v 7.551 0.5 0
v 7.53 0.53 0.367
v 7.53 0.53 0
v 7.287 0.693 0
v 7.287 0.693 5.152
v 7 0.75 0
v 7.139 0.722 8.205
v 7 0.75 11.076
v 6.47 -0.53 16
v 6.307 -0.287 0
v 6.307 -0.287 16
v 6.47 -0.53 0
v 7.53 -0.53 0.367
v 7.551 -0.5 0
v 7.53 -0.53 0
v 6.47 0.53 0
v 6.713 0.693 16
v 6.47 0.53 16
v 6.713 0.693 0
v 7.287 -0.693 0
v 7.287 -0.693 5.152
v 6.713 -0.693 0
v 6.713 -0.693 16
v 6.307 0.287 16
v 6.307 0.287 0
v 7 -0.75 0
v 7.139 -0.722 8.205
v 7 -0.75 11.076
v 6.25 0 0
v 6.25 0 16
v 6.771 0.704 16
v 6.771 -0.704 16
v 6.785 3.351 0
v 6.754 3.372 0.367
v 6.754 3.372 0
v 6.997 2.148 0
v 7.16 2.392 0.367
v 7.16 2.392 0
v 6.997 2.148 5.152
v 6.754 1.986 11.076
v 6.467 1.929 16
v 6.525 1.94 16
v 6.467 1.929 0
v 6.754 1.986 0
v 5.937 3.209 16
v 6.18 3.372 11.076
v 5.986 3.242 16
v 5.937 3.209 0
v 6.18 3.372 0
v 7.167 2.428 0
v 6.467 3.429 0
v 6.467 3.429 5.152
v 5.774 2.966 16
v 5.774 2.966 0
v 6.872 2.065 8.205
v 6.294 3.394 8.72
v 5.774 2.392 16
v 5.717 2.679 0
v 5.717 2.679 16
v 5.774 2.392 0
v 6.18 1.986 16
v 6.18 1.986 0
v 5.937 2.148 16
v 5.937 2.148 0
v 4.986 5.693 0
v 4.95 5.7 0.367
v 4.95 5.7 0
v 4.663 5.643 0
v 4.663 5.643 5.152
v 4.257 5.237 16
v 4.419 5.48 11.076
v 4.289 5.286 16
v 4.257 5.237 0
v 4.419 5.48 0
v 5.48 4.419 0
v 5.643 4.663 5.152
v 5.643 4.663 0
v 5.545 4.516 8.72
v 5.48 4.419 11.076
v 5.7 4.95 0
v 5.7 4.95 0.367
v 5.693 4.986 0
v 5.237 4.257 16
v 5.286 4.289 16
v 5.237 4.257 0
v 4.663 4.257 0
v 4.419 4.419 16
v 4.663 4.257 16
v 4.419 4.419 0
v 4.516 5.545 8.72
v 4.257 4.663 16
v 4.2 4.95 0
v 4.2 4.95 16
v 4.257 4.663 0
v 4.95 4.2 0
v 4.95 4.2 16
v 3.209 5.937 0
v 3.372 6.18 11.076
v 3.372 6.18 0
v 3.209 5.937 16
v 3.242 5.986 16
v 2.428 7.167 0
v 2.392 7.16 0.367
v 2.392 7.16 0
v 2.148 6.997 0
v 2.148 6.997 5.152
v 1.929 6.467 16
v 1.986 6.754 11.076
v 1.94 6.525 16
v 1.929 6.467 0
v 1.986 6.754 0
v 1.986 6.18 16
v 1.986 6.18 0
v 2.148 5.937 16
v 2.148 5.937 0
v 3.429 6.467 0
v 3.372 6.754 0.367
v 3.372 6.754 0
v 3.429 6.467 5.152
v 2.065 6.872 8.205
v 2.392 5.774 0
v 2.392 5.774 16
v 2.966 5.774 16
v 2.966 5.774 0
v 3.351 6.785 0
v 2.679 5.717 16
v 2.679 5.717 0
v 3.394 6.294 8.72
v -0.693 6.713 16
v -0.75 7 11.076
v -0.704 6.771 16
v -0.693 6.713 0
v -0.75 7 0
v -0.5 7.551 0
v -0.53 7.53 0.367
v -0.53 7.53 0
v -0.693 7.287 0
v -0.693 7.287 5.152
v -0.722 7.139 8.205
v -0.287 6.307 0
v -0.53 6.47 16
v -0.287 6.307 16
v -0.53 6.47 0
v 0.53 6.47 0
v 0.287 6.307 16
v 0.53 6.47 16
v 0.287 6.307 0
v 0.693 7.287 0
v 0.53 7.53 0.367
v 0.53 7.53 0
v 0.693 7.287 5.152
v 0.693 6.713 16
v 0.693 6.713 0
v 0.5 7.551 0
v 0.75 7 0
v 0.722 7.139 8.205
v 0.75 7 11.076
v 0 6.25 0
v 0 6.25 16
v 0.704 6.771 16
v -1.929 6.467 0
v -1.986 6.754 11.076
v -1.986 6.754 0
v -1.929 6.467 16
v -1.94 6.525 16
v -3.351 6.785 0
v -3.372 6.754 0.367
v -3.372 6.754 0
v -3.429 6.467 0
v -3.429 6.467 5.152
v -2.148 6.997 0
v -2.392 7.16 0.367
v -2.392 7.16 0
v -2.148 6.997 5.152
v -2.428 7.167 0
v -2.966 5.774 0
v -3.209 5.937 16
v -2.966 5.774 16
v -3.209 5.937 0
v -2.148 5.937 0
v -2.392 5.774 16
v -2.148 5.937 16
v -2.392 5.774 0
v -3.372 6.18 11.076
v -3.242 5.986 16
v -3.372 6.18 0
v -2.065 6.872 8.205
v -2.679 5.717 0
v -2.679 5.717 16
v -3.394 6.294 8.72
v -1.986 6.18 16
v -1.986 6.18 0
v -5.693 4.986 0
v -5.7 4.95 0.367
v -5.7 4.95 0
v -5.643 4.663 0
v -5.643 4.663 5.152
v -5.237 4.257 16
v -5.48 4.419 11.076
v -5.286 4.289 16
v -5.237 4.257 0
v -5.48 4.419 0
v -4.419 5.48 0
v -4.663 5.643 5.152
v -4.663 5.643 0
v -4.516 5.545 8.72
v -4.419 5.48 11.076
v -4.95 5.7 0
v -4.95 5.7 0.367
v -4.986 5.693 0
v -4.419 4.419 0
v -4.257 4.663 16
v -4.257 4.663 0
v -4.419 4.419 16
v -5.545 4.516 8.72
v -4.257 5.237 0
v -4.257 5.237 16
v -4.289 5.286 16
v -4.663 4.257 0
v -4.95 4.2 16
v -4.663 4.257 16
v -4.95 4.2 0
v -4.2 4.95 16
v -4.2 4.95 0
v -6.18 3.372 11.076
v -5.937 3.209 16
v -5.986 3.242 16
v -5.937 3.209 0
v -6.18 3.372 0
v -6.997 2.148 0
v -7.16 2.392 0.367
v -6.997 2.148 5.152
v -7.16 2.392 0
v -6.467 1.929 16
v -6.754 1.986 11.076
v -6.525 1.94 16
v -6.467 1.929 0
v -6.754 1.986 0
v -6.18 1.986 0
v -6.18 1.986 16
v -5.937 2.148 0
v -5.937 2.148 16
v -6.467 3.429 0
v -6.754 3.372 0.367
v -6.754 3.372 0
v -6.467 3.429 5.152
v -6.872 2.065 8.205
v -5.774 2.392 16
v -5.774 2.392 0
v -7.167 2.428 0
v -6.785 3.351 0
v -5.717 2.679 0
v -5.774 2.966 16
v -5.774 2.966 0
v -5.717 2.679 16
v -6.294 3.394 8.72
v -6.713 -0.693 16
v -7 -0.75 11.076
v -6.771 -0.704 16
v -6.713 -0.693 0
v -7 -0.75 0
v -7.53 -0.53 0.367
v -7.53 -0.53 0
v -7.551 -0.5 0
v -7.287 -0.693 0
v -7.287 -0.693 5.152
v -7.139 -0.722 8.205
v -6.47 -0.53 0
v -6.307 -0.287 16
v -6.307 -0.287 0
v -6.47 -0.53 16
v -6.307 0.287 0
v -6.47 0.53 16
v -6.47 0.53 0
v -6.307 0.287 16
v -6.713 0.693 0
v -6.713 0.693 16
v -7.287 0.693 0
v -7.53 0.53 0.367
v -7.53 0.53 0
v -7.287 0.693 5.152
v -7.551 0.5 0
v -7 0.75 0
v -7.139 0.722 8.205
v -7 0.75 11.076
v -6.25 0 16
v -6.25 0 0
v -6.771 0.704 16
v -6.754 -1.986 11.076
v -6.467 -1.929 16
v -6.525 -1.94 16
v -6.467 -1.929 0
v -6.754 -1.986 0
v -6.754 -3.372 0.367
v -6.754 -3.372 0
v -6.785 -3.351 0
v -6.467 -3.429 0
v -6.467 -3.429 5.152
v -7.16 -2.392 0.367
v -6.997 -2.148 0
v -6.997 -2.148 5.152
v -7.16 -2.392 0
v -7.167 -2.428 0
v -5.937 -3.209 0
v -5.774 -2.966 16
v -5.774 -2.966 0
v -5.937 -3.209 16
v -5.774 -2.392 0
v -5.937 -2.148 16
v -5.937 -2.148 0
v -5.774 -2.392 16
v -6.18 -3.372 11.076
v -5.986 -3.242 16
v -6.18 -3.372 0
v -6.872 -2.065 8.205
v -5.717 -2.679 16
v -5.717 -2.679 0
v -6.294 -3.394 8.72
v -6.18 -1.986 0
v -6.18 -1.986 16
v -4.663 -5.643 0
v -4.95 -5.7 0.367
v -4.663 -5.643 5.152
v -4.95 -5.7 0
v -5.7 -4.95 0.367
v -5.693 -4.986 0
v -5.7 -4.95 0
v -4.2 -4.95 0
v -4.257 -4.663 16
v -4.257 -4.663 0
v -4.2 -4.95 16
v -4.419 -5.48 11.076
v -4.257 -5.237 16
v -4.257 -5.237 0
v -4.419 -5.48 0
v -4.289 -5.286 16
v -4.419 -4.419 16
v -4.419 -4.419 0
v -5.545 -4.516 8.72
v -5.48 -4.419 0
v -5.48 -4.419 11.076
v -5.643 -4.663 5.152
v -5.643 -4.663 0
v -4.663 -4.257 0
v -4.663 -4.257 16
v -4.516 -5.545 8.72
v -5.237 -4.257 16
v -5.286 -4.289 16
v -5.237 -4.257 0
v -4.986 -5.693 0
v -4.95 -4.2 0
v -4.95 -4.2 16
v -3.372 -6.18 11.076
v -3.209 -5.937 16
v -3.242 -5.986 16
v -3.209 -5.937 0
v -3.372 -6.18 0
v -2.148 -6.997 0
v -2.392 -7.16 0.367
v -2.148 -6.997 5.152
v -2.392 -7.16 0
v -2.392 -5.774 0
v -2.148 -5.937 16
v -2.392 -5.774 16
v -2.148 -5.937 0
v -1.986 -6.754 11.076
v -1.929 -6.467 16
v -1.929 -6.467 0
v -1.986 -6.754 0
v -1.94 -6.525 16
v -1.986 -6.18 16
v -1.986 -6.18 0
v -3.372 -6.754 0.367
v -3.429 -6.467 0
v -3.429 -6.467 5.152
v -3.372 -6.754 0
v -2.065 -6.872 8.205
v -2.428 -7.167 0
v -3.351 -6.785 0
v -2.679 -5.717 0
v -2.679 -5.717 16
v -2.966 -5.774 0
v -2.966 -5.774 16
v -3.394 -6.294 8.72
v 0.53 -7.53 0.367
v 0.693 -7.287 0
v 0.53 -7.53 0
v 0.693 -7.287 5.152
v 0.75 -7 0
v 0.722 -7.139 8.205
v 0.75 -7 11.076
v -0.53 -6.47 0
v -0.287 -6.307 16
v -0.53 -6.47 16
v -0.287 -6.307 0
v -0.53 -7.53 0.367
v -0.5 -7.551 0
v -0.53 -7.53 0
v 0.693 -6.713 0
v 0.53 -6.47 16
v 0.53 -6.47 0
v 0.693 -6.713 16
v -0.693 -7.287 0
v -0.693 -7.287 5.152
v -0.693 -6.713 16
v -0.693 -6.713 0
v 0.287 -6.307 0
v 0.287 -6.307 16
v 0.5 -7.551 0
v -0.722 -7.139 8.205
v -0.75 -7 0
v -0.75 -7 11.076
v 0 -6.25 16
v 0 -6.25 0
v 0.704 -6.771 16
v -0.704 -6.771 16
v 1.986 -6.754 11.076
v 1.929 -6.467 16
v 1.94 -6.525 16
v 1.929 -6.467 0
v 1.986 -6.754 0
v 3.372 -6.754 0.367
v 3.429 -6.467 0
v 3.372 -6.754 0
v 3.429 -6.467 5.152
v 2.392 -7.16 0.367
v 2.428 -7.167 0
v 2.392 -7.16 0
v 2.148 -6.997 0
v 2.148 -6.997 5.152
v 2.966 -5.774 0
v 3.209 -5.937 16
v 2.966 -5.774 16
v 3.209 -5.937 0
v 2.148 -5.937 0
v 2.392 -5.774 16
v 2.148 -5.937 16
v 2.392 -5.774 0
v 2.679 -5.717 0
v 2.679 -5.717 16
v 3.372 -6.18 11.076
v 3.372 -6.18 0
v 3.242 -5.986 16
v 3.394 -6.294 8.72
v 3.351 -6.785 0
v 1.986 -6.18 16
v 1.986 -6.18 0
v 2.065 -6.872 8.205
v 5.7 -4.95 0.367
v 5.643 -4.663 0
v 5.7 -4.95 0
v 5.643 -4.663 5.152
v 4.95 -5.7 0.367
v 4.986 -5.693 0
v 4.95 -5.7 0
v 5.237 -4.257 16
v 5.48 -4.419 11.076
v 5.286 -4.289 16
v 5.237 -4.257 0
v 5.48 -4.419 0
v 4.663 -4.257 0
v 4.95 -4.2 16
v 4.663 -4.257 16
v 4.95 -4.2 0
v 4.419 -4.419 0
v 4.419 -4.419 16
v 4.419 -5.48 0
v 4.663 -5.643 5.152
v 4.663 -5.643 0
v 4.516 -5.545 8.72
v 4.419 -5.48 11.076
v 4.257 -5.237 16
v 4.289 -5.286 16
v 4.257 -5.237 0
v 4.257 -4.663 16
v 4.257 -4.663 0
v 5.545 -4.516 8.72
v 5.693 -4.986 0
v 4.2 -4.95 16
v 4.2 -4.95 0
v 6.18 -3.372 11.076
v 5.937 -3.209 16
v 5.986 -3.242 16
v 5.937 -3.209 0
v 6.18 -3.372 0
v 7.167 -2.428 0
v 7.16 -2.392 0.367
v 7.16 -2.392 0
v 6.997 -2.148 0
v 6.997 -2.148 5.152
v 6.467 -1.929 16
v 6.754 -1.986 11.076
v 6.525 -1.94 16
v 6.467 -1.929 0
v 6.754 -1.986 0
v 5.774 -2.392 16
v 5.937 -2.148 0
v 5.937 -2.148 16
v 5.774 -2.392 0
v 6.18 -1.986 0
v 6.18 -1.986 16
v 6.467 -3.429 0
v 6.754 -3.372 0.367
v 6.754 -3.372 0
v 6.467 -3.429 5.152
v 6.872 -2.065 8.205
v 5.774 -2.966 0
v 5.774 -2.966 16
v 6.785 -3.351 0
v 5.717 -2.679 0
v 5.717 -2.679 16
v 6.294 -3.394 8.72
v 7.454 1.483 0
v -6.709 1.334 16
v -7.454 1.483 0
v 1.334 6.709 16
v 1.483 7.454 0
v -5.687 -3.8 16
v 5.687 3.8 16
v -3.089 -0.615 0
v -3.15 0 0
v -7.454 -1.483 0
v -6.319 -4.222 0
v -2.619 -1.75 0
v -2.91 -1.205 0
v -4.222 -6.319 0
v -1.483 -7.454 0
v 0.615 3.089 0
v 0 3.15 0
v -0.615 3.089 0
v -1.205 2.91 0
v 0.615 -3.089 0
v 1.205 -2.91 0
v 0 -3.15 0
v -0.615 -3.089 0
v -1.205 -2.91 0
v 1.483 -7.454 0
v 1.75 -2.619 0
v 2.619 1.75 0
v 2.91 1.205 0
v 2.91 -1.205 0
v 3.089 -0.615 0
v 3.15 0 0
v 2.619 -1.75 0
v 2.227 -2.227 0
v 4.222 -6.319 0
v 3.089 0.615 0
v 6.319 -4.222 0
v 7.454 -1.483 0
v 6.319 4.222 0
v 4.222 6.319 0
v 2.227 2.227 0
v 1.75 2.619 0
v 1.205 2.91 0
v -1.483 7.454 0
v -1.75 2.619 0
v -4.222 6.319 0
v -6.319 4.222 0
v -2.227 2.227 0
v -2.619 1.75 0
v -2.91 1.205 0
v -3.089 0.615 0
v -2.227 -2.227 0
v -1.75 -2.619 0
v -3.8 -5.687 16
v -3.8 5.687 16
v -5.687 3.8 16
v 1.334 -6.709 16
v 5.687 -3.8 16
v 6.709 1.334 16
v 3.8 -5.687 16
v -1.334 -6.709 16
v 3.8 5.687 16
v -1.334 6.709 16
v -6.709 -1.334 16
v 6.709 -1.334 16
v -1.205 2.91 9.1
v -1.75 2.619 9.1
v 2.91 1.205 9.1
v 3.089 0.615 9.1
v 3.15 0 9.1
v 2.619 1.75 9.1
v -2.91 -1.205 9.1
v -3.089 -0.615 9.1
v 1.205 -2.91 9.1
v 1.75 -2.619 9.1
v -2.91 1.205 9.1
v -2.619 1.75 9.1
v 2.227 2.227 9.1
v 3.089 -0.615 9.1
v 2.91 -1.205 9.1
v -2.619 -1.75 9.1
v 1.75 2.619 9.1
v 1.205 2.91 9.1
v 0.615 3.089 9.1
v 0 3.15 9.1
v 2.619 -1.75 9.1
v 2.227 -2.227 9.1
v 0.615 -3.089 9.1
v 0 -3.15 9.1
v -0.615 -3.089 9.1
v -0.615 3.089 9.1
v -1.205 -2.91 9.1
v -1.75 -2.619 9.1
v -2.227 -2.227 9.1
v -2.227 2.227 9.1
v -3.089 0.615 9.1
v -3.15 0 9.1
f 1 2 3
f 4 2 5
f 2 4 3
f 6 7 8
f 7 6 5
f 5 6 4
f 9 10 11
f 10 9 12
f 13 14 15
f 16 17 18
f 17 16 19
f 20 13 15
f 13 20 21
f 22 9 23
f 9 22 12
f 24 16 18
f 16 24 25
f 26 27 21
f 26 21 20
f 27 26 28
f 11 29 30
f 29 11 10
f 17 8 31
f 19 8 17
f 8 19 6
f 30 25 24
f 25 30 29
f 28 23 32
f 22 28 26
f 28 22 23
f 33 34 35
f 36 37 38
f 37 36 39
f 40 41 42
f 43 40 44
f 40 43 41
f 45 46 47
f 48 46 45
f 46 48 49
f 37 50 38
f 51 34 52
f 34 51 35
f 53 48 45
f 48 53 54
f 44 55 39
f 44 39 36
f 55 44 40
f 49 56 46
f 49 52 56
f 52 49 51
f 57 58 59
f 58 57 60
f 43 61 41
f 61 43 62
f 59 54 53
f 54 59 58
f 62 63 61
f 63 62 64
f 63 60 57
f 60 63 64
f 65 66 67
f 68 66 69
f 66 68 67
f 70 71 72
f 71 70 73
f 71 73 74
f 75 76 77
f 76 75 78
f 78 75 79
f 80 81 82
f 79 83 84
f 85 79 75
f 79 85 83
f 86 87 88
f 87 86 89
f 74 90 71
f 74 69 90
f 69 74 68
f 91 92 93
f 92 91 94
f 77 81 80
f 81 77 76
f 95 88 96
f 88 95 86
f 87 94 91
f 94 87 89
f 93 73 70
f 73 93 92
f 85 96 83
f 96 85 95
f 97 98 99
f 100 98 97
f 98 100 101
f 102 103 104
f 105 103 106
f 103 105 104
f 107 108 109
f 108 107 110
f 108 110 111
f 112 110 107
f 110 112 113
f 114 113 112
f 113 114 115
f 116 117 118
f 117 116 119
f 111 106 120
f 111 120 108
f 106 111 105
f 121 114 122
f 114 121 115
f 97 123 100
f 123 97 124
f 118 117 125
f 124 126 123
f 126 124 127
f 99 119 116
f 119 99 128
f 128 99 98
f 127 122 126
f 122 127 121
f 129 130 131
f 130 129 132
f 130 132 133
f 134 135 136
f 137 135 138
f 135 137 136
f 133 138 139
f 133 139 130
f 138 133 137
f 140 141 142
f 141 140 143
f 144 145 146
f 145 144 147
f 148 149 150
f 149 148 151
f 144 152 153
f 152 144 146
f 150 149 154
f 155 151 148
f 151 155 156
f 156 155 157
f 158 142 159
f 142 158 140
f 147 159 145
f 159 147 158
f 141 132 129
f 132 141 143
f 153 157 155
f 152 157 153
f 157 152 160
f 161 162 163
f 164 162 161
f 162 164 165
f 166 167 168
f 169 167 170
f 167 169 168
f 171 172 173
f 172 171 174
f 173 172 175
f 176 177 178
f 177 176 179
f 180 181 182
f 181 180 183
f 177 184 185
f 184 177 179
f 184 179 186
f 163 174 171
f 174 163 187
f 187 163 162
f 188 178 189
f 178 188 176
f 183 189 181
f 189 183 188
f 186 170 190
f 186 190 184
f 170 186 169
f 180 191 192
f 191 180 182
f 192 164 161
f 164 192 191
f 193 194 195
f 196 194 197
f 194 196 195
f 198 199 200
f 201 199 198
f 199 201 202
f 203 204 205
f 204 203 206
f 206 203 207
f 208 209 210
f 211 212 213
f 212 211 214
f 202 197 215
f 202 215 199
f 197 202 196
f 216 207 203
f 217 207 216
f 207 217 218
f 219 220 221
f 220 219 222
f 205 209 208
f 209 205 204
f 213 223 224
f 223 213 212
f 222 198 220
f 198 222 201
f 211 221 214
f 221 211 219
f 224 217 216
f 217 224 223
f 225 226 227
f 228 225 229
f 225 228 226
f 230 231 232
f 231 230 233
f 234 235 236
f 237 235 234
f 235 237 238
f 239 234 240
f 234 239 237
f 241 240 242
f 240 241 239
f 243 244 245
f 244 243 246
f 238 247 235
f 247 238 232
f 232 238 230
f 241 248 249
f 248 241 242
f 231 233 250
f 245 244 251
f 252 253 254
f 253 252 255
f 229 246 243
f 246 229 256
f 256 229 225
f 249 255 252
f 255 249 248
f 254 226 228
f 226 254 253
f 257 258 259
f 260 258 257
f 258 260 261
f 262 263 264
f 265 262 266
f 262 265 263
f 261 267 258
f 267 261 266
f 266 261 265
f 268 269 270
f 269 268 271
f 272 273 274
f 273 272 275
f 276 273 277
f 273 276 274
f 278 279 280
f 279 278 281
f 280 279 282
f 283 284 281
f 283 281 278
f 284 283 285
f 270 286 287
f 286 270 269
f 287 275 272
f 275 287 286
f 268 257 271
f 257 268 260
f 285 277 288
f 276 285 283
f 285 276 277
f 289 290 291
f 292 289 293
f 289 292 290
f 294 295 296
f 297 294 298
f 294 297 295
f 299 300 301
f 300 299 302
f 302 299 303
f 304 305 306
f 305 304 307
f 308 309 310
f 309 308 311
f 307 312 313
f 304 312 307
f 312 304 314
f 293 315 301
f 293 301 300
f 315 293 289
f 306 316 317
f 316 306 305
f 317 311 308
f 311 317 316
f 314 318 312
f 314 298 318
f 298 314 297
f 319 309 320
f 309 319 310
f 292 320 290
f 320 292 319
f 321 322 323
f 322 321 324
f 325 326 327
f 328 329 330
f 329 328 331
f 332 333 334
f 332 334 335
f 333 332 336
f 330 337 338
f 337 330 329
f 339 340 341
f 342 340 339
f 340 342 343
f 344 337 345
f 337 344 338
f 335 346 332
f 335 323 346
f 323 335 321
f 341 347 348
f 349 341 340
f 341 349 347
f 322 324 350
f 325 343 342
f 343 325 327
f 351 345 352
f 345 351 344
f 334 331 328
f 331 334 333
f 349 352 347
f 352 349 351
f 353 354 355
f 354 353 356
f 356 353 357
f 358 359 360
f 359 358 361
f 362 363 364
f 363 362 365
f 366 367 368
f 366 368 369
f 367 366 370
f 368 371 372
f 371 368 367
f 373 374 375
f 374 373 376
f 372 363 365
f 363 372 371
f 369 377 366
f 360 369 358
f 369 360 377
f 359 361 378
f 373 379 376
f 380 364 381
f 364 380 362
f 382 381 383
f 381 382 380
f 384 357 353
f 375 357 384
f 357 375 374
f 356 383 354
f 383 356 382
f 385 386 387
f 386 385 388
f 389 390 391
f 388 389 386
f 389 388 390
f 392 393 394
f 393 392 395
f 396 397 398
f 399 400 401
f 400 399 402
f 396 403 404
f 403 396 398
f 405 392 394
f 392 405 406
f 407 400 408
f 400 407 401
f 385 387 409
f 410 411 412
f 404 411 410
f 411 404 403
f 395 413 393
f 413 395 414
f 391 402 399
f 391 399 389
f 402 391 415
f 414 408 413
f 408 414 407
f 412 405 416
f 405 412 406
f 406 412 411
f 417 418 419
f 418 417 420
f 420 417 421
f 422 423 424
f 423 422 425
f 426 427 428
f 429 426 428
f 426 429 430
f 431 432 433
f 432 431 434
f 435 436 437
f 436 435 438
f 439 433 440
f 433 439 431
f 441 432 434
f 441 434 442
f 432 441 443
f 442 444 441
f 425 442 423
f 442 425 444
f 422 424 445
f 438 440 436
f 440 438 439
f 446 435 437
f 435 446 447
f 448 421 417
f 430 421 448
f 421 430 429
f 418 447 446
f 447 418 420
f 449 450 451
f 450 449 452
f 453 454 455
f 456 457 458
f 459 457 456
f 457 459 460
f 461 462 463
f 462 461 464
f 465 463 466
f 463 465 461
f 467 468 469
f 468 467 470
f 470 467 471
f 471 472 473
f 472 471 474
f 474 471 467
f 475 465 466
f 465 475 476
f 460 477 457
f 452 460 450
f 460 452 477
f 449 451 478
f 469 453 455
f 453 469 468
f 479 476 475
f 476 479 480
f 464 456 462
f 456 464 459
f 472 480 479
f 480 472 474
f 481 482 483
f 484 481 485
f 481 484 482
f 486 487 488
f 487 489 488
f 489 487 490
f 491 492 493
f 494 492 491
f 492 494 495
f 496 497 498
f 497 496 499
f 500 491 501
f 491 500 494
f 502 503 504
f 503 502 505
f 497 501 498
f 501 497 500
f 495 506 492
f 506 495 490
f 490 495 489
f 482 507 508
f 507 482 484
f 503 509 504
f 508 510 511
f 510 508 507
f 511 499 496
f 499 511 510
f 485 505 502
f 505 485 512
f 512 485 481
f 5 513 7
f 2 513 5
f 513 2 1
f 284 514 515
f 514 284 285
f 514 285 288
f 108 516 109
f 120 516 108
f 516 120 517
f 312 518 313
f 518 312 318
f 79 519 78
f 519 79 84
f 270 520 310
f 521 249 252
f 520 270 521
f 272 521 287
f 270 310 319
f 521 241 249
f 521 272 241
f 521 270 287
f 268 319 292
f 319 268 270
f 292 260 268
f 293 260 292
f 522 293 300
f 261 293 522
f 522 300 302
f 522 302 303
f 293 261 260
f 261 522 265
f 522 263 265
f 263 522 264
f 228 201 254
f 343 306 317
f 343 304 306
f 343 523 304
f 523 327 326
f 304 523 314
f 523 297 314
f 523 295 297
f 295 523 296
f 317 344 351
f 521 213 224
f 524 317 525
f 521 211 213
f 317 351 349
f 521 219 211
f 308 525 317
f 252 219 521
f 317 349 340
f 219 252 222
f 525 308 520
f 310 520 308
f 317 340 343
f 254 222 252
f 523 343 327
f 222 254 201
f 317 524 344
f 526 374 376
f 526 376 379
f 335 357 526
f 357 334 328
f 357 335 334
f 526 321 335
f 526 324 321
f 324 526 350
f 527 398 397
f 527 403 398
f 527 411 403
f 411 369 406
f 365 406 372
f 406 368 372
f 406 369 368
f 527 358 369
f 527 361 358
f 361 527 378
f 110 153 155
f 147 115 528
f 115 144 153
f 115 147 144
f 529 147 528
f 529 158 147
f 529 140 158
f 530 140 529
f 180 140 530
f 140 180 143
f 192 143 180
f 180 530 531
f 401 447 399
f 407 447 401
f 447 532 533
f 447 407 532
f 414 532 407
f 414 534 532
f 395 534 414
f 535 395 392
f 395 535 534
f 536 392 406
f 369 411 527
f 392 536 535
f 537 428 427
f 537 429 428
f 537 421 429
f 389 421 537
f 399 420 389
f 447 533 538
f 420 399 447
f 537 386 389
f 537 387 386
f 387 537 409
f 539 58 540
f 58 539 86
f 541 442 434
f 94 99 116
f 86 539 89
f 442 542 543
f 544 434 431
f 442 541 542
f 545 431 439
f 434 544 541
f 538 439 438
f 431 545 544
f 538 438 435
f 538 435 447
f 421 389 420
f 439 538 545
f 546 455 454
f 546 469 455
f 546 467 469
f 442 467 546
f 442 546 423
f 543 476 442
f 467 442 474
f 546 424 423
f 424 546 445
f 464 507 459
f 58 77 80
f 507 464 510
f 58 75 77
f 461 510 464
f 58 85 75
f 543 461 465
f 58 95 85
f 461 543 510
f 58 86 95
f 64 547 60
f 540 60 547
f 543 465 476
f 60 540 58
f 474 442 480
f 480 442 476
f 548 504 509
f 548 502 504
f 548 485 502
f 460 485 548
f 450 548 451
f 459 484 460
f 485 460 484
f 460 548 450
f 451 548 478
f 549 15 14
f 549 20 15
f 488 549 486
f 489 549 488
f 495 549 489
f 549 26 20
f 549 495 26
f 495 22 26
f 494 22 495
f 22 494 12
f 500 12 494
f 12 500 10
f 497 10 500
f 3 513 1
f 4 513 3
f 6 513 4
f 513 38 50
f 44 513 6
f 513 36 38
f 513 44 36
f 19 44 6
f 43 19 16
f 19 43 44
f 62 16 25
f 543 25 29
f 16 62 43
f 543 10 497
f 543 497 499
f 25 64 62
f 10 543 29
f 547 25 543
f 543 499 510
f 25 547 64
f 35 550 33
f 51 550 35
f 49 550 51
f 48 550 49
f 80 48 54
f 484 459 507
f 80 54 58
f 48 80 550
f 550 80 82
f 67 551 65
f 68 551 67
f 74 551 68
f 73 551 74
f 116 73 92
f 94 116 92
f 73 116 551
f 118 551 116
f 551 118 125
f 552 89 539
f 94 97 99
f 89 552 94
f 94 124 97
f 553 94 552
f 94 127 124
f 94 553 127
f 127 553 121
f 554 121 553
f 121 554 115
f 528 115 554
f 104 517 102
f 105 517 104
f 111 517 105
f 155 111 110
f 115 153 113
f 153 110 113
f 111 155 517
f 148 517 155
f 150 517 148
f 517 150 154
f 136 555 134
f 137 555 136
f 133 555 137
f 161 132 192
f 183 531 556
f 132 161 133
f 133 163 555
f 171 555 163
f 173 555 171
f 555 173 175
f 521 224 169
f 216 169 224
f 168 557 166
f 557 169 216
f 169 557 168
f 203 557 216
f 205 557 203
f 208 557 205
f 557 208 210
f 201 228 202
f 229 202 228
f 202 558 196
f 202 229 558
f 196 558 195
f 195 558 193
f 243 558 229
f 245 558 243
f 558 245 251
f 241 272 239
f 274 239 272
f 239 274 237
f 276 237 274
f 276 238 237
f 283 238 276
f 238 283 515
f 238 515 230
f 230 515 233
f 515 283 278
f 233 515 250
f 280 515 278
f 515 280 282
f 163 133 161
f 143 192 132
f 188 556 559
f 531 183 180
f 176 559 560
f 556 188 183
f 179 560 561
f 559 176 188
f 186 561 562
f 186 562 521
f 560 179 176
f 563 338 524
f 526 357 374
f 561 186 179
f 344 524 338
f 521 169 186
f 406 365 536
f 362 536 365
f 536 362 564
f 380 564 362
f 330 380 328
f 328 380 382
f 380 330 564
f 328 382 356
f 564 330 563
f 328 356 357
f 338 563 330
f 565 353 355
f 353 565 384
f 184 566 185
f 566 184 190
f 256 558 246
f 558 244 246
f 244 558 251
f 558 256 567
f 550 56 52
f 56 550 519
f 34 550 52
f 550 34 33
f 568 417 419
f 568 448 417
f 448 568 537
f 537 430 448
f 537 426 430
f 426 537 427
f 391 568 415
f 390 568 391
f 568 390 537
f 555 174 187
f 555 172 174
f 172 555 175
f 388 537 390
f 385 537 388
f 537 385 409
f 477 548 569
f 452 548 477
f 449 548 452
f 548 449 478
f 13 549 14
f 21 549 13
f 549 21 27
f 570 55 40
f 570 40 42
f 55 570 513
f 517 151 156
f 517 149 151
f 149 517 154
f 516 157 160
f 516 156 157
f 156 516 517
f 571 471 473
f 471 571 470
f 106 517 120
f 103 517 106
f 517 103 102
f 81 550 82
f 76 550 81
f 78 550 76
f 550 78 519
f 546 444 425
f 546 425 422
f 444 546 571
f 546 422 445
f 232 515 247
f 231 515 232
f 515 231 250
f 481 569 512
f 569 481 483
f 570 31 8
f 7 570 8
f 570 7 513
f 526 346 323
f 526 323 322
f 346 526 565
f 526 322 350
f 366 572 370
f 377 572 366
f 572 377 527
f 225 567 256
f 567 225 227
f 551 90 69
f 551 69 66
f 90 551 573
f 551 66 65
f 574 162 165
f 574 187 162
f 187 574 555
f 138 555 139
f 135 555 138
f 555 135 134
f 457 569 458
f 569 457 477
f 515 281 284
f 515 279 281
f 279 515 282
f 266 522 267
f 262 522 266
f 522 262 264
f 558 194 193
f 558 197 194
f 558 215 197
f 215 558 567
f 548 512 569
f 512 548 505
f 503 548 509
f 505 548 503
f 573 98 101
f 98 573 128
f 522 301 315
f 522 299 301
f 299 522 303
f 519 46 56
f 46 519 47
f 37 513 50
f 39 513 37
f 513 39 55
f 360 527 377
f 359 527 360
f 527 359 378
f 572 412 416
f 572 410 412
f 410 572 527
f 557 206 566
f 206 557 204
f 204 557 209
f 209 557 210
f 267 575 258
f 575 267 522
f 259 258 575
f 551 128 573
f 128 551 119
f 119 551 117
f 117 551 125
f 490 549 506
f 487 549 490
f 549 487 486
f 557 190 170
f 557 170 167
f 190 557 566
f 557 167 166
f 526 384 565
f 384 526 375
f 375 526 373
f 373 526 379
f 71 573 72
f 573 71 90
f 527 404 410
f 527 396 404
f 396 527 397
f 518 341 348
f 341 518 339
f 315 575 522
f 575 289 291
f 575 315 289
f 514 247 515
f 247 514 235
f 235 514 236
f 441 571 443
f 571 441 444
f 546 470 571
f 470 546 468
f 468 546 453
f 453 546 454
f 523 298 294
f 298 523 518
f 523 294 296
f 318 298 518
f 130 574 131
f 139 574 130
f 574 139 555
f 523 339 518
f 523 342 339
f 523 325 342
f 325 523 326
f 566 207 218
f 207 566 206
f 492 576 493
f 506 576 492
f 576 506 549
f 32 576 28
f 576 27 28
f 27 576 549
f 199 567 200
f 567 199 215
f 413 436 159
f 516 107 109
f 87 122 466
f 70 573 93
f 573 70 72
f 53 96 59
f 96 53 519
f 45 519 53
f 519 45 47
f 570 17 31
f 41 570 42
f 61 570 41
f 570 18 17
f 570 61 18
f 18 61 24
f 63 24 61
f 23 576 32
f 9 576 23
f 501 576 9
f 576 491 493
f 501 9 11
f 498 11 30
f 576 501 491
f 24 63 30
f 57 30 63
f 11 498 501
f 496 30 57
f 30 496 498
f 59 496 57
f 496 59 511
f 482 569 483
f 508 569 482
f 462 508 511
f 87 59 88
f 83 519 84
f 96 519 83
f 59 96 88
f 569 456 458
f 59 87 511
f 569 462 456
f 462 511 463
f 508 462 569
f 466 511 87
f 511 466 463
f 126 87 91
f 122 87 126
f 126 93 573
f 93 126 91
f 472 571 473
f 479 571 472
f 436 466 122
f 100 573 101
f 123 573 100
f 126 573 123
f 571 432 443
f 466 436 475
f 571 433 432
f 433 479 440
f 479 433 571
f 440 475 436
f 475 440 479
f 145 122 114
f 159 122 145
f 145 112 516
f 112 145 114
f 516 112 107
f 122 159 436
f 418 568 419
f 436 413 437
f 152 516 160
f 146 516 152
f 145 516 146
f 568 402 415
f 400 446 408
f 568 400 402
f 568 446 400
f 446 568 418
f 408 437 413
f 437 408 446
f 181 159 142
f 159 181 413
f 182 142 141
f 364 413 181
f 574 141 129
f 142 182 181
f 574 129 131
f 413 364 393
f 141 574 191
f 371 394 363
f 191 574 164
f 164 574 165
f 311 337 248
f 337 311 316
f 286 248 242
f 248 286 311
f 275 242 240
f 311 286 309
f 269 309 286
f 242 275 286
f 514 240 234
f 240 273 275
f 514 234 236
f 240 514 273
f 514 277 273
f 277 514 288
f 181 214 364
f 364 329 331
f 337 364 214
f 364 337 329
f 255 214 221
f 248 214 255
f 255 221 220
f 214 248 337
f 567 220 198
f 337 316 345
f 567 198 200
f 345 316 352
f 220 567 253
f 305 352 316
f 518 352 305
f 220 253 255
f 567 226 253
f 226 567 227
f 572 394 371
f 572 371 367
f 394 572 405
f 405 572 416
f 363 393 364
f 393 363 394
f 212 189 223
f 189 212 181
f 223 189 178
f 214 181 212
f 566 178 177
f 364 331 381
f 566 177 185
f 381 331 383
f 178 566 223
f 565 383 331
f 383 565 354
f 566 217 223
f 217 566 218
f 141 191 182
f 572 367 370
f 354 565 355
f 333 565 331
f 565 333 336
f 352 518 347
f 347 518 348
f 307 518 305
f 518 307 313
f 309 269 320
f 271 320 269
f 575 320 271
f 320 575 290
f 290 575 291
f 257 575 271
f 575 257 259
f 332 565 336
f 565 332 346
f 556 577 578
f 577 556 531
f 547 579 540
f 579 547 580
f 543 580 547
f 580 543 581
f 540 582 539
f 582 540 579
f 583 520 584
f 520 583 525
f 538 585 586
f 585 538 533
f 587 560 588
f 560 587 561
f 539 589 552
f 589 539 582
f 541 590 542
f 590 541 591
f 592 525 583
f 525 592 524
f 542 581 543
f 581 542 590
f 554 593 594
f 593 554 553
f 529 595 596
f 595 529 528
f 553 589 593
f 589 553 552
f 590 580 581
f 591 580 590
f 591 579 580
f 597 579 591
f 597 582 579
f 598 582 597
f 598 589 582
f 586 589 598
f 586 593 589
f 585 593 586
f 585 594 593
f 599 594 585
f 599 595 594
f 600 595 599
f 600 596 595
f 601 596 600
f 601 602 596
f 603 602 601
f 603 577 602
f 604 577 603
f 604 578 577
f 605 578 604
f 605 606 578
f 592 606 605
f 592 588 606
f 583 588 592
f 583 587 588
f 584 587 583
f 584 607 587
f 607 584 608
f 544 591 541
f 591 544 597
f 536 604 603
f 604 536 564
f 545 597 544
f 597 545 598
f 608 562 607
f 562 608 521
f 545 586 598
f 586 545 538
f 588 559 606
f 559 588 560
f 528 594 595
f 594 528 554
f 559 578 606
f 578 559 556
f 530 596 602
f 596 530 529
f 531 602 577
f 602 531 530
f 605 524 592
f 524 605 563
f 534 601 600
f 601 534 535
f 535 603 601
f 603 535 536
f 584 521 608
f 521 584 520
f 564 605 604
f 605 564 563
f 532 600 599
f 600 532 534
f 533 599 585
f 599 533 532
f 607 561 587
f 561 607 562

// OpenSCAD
// ACCESS KNOB — Synthesis Technology / XOR Electronics Knob
// Generated via CLI for Studio Knobs
module access_knob_xor_synth() {
  outer_d = 15.2;
  height = 16;
  taper = 0.9;
  bore_d = 6;
  slot_h = 9;
  tex_depth = 1.2;
  tex_scale = 1.5;
  tex_count = 16;

  difference() {
    cylinder(h=height, d1=outer_d, d2=outer_d*taper, $fn=32);
    translate([0,0,-0.1]) cylinder(h=slot_h+0.2, d=bore_d + 0.3, $fn=32);
    for(i=[0:tex_count-1]) {
      rotate([0,0,i*(360/tex_count)])
        translate([outer_d/2-tex_depth/2, 0, height/2])
          cylinder(h=height*1.1, d=tex_scale, center=true, $fn=16);
    }
  }
}
access_knob_xor_synth();
